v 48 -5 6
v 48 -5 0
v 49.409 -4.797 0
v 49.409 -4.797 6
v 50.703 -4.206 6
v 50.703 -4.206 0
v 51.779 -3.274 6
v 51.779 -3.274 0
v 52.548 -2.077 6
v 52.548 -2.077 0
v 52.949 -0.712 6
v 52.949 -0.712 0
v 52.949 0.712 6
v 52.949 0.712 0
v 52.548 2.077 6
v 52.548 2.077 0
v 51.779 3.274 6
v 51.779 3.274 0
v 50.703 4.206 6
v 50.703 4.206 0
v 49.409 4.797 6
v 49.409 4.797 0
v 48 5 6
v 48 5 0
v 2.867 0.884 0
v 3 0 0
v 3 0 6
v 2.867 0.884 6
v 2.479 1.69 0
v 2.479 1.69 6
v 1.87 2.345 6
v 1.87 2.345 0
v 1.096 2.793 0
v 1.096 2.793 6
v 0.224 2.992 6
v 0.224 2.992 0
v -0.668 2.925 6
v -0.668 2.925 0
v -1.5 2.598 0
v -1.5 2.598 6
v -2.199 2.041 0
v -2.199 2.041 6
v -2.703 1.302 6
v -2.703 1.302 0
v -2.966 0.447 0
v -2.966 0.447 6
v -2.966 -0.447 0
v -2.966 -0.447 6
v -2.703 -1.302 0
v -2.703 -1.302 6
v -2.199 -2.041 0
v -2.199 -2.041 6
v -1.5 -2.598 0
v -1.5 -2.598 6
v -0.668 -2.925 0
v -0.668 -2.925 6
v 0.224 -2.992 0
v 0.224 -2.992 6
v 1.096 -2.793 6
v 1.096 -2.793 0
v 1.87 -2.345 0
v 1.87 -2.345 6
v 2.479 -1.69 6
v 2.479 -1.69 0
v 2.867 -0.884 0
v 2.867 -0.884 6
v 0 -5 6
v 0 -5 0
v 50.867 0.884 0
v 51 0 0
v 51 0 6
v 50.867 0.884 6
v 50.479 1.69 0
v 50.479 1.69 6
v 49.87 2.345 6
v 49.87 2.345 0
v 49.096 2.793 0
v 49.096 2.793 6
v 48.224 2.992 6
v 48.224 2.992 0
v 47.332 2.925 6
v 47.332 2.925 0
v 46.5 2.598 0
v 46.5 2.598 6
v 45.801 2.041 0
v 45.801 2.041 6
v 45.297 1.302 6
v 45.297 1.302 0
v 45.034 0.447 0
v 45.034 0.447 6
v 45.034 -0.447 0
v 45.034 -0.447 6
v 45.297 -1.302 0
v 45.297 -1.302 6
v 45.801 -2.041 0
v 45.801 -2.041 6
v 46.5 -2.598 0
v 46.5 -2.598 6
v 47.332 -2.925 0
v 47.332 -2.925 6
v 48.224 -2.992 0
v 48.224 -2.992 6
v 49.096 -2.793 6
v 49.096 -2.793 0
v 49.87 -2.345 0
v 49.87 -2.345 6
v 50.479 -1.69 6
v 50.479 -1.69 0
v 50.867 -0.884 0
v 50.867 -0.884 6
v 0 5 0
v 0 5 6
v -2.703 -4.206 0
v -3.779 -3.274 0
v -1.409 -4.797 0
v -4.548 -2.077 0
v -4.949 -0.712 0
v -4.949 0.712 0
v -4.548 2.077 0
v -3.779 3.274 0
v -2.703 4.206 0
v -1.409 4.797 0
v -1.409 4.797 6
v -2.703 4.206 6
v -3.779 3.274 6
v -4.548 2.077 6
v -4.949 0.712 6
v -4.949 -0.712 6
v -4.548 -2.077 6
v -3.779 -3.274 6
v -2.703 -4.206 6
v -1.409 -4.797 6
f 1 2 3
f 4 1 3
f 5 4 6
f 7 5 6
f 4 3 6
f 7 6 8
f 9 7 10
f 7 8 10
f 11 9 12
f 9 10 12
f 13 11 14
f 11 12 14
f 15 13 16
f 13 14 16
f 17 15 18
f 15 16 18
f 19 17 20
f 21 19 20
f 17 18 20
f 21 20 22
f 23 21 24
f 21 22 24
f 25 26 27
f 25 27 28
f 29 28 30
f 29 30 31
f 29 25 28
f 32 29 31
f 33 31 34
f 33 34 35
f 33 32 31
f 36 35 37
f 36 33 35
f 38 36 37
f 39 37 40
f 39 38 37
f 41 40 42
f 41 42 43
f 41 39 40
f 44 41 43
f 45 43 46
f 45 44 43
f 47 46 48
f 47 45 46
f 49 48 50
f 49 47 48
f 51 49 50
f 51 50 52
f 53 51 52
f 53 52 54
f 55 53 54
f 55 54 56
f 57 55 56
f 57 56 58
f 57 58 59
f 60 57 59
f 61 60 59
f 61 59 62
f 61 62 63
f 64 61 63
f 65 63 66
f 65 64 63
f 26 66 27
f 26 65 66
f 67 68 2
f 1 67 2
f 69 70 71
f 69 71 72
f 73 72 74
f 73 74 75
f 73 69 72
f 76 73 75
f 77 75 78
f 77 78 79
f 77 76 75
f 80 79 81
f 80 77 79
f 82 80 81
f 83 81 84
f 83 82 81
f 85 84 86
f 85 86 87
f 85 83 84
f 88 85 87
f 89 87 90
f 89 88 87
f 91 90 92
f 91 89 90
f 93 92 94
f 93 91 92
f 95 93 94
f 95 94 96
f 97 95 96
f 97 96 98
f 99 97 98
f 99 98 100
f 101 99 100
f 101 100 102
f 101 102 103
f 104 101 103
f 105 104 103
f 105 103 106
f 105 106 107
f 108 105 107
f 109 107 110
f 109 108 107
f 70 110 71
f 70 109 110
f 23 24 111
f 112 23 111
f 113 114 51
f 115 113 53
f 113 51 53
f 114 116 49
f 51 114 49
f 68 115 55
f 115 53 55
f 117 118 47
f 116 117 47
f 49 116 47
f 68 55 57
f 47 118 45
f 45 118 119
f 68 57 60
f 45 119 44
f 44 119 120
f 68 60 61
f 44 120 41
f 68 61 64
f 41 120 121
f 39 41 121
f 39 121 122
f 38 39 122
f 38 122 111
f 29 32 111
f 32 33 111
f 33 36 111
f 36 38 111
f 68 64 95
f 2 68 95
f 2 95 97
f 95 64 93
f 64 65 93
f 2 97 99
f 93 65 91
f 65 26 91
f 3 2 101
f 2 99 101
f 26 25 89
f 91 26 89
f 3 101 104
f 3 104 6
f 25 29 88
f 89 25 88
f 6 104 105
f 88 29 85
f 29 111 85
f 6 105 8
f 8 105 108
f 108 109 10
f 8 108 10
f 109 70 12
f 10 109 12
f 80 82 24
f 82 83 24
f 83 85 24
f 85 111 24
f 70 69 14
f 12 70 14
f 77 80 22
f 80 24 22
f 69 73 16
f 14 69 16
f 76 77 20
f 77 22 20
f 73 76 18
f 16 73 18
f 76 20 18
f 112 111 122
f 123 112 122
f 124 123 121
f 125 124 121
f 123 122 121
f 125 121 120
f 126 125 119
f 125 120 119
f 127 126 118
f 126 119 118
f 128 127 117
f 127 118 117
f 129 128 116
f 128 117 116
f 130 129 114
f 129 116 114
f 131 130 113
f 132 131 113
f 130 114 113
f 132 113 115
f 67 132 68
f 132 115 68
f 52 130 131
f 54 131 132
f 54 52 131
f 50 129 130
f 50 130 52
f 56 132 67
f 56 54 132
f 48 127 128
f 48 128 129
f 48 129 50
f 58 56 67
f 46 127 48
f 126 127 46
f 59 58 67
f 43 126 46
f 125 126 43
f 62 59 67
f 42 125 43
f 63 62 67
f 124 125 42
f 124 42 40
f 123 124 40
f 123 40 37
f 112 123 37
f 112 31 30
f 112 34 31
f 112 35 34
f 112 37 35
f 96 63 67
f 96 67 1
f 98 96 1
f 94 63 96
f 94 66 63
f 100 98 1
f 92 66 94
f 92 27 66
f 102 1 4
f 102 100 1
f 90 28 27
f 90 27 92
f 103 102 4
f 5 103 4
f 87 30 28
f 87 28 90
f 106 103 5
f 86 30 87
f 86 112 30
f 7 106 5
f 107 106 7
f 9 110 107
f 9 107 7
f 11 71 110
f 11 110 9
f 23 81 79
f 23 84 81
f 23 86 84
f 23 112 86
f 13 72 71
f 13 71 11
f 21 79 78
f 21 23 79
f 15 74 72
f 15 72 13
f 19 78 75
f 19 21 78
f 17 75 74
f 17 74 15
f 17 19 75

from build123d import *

# Parameters (mm, degrees)
SKETCH1_R           = 3
BOSS_EXTRUDE1_DEPTH = 6


with BuildPart() as part:
    # Sketch1 → Boss-Extrude1 (new body)
    with BuildSketch(Plane.XY):
        with BuildLine():
            ThreePointArc((0, 5), (-5, 0), (0, -5))
            Line((0, -5), (48, -5))
            ThreePointArc((48, -5), (53, 0), (48, 5))
            Line((48, 5), (0, 5))
        make_face()
        Circle(SKETCH1_R, mode=Mode.SUBTRACT)
        with Locations((48, 0)):
            Circle(SKETCH1_R, mode=Mode.SUBTRACT)
    extrude(amount=BOSS_EXTRUDE1_DEPTH)


solid = part.part
